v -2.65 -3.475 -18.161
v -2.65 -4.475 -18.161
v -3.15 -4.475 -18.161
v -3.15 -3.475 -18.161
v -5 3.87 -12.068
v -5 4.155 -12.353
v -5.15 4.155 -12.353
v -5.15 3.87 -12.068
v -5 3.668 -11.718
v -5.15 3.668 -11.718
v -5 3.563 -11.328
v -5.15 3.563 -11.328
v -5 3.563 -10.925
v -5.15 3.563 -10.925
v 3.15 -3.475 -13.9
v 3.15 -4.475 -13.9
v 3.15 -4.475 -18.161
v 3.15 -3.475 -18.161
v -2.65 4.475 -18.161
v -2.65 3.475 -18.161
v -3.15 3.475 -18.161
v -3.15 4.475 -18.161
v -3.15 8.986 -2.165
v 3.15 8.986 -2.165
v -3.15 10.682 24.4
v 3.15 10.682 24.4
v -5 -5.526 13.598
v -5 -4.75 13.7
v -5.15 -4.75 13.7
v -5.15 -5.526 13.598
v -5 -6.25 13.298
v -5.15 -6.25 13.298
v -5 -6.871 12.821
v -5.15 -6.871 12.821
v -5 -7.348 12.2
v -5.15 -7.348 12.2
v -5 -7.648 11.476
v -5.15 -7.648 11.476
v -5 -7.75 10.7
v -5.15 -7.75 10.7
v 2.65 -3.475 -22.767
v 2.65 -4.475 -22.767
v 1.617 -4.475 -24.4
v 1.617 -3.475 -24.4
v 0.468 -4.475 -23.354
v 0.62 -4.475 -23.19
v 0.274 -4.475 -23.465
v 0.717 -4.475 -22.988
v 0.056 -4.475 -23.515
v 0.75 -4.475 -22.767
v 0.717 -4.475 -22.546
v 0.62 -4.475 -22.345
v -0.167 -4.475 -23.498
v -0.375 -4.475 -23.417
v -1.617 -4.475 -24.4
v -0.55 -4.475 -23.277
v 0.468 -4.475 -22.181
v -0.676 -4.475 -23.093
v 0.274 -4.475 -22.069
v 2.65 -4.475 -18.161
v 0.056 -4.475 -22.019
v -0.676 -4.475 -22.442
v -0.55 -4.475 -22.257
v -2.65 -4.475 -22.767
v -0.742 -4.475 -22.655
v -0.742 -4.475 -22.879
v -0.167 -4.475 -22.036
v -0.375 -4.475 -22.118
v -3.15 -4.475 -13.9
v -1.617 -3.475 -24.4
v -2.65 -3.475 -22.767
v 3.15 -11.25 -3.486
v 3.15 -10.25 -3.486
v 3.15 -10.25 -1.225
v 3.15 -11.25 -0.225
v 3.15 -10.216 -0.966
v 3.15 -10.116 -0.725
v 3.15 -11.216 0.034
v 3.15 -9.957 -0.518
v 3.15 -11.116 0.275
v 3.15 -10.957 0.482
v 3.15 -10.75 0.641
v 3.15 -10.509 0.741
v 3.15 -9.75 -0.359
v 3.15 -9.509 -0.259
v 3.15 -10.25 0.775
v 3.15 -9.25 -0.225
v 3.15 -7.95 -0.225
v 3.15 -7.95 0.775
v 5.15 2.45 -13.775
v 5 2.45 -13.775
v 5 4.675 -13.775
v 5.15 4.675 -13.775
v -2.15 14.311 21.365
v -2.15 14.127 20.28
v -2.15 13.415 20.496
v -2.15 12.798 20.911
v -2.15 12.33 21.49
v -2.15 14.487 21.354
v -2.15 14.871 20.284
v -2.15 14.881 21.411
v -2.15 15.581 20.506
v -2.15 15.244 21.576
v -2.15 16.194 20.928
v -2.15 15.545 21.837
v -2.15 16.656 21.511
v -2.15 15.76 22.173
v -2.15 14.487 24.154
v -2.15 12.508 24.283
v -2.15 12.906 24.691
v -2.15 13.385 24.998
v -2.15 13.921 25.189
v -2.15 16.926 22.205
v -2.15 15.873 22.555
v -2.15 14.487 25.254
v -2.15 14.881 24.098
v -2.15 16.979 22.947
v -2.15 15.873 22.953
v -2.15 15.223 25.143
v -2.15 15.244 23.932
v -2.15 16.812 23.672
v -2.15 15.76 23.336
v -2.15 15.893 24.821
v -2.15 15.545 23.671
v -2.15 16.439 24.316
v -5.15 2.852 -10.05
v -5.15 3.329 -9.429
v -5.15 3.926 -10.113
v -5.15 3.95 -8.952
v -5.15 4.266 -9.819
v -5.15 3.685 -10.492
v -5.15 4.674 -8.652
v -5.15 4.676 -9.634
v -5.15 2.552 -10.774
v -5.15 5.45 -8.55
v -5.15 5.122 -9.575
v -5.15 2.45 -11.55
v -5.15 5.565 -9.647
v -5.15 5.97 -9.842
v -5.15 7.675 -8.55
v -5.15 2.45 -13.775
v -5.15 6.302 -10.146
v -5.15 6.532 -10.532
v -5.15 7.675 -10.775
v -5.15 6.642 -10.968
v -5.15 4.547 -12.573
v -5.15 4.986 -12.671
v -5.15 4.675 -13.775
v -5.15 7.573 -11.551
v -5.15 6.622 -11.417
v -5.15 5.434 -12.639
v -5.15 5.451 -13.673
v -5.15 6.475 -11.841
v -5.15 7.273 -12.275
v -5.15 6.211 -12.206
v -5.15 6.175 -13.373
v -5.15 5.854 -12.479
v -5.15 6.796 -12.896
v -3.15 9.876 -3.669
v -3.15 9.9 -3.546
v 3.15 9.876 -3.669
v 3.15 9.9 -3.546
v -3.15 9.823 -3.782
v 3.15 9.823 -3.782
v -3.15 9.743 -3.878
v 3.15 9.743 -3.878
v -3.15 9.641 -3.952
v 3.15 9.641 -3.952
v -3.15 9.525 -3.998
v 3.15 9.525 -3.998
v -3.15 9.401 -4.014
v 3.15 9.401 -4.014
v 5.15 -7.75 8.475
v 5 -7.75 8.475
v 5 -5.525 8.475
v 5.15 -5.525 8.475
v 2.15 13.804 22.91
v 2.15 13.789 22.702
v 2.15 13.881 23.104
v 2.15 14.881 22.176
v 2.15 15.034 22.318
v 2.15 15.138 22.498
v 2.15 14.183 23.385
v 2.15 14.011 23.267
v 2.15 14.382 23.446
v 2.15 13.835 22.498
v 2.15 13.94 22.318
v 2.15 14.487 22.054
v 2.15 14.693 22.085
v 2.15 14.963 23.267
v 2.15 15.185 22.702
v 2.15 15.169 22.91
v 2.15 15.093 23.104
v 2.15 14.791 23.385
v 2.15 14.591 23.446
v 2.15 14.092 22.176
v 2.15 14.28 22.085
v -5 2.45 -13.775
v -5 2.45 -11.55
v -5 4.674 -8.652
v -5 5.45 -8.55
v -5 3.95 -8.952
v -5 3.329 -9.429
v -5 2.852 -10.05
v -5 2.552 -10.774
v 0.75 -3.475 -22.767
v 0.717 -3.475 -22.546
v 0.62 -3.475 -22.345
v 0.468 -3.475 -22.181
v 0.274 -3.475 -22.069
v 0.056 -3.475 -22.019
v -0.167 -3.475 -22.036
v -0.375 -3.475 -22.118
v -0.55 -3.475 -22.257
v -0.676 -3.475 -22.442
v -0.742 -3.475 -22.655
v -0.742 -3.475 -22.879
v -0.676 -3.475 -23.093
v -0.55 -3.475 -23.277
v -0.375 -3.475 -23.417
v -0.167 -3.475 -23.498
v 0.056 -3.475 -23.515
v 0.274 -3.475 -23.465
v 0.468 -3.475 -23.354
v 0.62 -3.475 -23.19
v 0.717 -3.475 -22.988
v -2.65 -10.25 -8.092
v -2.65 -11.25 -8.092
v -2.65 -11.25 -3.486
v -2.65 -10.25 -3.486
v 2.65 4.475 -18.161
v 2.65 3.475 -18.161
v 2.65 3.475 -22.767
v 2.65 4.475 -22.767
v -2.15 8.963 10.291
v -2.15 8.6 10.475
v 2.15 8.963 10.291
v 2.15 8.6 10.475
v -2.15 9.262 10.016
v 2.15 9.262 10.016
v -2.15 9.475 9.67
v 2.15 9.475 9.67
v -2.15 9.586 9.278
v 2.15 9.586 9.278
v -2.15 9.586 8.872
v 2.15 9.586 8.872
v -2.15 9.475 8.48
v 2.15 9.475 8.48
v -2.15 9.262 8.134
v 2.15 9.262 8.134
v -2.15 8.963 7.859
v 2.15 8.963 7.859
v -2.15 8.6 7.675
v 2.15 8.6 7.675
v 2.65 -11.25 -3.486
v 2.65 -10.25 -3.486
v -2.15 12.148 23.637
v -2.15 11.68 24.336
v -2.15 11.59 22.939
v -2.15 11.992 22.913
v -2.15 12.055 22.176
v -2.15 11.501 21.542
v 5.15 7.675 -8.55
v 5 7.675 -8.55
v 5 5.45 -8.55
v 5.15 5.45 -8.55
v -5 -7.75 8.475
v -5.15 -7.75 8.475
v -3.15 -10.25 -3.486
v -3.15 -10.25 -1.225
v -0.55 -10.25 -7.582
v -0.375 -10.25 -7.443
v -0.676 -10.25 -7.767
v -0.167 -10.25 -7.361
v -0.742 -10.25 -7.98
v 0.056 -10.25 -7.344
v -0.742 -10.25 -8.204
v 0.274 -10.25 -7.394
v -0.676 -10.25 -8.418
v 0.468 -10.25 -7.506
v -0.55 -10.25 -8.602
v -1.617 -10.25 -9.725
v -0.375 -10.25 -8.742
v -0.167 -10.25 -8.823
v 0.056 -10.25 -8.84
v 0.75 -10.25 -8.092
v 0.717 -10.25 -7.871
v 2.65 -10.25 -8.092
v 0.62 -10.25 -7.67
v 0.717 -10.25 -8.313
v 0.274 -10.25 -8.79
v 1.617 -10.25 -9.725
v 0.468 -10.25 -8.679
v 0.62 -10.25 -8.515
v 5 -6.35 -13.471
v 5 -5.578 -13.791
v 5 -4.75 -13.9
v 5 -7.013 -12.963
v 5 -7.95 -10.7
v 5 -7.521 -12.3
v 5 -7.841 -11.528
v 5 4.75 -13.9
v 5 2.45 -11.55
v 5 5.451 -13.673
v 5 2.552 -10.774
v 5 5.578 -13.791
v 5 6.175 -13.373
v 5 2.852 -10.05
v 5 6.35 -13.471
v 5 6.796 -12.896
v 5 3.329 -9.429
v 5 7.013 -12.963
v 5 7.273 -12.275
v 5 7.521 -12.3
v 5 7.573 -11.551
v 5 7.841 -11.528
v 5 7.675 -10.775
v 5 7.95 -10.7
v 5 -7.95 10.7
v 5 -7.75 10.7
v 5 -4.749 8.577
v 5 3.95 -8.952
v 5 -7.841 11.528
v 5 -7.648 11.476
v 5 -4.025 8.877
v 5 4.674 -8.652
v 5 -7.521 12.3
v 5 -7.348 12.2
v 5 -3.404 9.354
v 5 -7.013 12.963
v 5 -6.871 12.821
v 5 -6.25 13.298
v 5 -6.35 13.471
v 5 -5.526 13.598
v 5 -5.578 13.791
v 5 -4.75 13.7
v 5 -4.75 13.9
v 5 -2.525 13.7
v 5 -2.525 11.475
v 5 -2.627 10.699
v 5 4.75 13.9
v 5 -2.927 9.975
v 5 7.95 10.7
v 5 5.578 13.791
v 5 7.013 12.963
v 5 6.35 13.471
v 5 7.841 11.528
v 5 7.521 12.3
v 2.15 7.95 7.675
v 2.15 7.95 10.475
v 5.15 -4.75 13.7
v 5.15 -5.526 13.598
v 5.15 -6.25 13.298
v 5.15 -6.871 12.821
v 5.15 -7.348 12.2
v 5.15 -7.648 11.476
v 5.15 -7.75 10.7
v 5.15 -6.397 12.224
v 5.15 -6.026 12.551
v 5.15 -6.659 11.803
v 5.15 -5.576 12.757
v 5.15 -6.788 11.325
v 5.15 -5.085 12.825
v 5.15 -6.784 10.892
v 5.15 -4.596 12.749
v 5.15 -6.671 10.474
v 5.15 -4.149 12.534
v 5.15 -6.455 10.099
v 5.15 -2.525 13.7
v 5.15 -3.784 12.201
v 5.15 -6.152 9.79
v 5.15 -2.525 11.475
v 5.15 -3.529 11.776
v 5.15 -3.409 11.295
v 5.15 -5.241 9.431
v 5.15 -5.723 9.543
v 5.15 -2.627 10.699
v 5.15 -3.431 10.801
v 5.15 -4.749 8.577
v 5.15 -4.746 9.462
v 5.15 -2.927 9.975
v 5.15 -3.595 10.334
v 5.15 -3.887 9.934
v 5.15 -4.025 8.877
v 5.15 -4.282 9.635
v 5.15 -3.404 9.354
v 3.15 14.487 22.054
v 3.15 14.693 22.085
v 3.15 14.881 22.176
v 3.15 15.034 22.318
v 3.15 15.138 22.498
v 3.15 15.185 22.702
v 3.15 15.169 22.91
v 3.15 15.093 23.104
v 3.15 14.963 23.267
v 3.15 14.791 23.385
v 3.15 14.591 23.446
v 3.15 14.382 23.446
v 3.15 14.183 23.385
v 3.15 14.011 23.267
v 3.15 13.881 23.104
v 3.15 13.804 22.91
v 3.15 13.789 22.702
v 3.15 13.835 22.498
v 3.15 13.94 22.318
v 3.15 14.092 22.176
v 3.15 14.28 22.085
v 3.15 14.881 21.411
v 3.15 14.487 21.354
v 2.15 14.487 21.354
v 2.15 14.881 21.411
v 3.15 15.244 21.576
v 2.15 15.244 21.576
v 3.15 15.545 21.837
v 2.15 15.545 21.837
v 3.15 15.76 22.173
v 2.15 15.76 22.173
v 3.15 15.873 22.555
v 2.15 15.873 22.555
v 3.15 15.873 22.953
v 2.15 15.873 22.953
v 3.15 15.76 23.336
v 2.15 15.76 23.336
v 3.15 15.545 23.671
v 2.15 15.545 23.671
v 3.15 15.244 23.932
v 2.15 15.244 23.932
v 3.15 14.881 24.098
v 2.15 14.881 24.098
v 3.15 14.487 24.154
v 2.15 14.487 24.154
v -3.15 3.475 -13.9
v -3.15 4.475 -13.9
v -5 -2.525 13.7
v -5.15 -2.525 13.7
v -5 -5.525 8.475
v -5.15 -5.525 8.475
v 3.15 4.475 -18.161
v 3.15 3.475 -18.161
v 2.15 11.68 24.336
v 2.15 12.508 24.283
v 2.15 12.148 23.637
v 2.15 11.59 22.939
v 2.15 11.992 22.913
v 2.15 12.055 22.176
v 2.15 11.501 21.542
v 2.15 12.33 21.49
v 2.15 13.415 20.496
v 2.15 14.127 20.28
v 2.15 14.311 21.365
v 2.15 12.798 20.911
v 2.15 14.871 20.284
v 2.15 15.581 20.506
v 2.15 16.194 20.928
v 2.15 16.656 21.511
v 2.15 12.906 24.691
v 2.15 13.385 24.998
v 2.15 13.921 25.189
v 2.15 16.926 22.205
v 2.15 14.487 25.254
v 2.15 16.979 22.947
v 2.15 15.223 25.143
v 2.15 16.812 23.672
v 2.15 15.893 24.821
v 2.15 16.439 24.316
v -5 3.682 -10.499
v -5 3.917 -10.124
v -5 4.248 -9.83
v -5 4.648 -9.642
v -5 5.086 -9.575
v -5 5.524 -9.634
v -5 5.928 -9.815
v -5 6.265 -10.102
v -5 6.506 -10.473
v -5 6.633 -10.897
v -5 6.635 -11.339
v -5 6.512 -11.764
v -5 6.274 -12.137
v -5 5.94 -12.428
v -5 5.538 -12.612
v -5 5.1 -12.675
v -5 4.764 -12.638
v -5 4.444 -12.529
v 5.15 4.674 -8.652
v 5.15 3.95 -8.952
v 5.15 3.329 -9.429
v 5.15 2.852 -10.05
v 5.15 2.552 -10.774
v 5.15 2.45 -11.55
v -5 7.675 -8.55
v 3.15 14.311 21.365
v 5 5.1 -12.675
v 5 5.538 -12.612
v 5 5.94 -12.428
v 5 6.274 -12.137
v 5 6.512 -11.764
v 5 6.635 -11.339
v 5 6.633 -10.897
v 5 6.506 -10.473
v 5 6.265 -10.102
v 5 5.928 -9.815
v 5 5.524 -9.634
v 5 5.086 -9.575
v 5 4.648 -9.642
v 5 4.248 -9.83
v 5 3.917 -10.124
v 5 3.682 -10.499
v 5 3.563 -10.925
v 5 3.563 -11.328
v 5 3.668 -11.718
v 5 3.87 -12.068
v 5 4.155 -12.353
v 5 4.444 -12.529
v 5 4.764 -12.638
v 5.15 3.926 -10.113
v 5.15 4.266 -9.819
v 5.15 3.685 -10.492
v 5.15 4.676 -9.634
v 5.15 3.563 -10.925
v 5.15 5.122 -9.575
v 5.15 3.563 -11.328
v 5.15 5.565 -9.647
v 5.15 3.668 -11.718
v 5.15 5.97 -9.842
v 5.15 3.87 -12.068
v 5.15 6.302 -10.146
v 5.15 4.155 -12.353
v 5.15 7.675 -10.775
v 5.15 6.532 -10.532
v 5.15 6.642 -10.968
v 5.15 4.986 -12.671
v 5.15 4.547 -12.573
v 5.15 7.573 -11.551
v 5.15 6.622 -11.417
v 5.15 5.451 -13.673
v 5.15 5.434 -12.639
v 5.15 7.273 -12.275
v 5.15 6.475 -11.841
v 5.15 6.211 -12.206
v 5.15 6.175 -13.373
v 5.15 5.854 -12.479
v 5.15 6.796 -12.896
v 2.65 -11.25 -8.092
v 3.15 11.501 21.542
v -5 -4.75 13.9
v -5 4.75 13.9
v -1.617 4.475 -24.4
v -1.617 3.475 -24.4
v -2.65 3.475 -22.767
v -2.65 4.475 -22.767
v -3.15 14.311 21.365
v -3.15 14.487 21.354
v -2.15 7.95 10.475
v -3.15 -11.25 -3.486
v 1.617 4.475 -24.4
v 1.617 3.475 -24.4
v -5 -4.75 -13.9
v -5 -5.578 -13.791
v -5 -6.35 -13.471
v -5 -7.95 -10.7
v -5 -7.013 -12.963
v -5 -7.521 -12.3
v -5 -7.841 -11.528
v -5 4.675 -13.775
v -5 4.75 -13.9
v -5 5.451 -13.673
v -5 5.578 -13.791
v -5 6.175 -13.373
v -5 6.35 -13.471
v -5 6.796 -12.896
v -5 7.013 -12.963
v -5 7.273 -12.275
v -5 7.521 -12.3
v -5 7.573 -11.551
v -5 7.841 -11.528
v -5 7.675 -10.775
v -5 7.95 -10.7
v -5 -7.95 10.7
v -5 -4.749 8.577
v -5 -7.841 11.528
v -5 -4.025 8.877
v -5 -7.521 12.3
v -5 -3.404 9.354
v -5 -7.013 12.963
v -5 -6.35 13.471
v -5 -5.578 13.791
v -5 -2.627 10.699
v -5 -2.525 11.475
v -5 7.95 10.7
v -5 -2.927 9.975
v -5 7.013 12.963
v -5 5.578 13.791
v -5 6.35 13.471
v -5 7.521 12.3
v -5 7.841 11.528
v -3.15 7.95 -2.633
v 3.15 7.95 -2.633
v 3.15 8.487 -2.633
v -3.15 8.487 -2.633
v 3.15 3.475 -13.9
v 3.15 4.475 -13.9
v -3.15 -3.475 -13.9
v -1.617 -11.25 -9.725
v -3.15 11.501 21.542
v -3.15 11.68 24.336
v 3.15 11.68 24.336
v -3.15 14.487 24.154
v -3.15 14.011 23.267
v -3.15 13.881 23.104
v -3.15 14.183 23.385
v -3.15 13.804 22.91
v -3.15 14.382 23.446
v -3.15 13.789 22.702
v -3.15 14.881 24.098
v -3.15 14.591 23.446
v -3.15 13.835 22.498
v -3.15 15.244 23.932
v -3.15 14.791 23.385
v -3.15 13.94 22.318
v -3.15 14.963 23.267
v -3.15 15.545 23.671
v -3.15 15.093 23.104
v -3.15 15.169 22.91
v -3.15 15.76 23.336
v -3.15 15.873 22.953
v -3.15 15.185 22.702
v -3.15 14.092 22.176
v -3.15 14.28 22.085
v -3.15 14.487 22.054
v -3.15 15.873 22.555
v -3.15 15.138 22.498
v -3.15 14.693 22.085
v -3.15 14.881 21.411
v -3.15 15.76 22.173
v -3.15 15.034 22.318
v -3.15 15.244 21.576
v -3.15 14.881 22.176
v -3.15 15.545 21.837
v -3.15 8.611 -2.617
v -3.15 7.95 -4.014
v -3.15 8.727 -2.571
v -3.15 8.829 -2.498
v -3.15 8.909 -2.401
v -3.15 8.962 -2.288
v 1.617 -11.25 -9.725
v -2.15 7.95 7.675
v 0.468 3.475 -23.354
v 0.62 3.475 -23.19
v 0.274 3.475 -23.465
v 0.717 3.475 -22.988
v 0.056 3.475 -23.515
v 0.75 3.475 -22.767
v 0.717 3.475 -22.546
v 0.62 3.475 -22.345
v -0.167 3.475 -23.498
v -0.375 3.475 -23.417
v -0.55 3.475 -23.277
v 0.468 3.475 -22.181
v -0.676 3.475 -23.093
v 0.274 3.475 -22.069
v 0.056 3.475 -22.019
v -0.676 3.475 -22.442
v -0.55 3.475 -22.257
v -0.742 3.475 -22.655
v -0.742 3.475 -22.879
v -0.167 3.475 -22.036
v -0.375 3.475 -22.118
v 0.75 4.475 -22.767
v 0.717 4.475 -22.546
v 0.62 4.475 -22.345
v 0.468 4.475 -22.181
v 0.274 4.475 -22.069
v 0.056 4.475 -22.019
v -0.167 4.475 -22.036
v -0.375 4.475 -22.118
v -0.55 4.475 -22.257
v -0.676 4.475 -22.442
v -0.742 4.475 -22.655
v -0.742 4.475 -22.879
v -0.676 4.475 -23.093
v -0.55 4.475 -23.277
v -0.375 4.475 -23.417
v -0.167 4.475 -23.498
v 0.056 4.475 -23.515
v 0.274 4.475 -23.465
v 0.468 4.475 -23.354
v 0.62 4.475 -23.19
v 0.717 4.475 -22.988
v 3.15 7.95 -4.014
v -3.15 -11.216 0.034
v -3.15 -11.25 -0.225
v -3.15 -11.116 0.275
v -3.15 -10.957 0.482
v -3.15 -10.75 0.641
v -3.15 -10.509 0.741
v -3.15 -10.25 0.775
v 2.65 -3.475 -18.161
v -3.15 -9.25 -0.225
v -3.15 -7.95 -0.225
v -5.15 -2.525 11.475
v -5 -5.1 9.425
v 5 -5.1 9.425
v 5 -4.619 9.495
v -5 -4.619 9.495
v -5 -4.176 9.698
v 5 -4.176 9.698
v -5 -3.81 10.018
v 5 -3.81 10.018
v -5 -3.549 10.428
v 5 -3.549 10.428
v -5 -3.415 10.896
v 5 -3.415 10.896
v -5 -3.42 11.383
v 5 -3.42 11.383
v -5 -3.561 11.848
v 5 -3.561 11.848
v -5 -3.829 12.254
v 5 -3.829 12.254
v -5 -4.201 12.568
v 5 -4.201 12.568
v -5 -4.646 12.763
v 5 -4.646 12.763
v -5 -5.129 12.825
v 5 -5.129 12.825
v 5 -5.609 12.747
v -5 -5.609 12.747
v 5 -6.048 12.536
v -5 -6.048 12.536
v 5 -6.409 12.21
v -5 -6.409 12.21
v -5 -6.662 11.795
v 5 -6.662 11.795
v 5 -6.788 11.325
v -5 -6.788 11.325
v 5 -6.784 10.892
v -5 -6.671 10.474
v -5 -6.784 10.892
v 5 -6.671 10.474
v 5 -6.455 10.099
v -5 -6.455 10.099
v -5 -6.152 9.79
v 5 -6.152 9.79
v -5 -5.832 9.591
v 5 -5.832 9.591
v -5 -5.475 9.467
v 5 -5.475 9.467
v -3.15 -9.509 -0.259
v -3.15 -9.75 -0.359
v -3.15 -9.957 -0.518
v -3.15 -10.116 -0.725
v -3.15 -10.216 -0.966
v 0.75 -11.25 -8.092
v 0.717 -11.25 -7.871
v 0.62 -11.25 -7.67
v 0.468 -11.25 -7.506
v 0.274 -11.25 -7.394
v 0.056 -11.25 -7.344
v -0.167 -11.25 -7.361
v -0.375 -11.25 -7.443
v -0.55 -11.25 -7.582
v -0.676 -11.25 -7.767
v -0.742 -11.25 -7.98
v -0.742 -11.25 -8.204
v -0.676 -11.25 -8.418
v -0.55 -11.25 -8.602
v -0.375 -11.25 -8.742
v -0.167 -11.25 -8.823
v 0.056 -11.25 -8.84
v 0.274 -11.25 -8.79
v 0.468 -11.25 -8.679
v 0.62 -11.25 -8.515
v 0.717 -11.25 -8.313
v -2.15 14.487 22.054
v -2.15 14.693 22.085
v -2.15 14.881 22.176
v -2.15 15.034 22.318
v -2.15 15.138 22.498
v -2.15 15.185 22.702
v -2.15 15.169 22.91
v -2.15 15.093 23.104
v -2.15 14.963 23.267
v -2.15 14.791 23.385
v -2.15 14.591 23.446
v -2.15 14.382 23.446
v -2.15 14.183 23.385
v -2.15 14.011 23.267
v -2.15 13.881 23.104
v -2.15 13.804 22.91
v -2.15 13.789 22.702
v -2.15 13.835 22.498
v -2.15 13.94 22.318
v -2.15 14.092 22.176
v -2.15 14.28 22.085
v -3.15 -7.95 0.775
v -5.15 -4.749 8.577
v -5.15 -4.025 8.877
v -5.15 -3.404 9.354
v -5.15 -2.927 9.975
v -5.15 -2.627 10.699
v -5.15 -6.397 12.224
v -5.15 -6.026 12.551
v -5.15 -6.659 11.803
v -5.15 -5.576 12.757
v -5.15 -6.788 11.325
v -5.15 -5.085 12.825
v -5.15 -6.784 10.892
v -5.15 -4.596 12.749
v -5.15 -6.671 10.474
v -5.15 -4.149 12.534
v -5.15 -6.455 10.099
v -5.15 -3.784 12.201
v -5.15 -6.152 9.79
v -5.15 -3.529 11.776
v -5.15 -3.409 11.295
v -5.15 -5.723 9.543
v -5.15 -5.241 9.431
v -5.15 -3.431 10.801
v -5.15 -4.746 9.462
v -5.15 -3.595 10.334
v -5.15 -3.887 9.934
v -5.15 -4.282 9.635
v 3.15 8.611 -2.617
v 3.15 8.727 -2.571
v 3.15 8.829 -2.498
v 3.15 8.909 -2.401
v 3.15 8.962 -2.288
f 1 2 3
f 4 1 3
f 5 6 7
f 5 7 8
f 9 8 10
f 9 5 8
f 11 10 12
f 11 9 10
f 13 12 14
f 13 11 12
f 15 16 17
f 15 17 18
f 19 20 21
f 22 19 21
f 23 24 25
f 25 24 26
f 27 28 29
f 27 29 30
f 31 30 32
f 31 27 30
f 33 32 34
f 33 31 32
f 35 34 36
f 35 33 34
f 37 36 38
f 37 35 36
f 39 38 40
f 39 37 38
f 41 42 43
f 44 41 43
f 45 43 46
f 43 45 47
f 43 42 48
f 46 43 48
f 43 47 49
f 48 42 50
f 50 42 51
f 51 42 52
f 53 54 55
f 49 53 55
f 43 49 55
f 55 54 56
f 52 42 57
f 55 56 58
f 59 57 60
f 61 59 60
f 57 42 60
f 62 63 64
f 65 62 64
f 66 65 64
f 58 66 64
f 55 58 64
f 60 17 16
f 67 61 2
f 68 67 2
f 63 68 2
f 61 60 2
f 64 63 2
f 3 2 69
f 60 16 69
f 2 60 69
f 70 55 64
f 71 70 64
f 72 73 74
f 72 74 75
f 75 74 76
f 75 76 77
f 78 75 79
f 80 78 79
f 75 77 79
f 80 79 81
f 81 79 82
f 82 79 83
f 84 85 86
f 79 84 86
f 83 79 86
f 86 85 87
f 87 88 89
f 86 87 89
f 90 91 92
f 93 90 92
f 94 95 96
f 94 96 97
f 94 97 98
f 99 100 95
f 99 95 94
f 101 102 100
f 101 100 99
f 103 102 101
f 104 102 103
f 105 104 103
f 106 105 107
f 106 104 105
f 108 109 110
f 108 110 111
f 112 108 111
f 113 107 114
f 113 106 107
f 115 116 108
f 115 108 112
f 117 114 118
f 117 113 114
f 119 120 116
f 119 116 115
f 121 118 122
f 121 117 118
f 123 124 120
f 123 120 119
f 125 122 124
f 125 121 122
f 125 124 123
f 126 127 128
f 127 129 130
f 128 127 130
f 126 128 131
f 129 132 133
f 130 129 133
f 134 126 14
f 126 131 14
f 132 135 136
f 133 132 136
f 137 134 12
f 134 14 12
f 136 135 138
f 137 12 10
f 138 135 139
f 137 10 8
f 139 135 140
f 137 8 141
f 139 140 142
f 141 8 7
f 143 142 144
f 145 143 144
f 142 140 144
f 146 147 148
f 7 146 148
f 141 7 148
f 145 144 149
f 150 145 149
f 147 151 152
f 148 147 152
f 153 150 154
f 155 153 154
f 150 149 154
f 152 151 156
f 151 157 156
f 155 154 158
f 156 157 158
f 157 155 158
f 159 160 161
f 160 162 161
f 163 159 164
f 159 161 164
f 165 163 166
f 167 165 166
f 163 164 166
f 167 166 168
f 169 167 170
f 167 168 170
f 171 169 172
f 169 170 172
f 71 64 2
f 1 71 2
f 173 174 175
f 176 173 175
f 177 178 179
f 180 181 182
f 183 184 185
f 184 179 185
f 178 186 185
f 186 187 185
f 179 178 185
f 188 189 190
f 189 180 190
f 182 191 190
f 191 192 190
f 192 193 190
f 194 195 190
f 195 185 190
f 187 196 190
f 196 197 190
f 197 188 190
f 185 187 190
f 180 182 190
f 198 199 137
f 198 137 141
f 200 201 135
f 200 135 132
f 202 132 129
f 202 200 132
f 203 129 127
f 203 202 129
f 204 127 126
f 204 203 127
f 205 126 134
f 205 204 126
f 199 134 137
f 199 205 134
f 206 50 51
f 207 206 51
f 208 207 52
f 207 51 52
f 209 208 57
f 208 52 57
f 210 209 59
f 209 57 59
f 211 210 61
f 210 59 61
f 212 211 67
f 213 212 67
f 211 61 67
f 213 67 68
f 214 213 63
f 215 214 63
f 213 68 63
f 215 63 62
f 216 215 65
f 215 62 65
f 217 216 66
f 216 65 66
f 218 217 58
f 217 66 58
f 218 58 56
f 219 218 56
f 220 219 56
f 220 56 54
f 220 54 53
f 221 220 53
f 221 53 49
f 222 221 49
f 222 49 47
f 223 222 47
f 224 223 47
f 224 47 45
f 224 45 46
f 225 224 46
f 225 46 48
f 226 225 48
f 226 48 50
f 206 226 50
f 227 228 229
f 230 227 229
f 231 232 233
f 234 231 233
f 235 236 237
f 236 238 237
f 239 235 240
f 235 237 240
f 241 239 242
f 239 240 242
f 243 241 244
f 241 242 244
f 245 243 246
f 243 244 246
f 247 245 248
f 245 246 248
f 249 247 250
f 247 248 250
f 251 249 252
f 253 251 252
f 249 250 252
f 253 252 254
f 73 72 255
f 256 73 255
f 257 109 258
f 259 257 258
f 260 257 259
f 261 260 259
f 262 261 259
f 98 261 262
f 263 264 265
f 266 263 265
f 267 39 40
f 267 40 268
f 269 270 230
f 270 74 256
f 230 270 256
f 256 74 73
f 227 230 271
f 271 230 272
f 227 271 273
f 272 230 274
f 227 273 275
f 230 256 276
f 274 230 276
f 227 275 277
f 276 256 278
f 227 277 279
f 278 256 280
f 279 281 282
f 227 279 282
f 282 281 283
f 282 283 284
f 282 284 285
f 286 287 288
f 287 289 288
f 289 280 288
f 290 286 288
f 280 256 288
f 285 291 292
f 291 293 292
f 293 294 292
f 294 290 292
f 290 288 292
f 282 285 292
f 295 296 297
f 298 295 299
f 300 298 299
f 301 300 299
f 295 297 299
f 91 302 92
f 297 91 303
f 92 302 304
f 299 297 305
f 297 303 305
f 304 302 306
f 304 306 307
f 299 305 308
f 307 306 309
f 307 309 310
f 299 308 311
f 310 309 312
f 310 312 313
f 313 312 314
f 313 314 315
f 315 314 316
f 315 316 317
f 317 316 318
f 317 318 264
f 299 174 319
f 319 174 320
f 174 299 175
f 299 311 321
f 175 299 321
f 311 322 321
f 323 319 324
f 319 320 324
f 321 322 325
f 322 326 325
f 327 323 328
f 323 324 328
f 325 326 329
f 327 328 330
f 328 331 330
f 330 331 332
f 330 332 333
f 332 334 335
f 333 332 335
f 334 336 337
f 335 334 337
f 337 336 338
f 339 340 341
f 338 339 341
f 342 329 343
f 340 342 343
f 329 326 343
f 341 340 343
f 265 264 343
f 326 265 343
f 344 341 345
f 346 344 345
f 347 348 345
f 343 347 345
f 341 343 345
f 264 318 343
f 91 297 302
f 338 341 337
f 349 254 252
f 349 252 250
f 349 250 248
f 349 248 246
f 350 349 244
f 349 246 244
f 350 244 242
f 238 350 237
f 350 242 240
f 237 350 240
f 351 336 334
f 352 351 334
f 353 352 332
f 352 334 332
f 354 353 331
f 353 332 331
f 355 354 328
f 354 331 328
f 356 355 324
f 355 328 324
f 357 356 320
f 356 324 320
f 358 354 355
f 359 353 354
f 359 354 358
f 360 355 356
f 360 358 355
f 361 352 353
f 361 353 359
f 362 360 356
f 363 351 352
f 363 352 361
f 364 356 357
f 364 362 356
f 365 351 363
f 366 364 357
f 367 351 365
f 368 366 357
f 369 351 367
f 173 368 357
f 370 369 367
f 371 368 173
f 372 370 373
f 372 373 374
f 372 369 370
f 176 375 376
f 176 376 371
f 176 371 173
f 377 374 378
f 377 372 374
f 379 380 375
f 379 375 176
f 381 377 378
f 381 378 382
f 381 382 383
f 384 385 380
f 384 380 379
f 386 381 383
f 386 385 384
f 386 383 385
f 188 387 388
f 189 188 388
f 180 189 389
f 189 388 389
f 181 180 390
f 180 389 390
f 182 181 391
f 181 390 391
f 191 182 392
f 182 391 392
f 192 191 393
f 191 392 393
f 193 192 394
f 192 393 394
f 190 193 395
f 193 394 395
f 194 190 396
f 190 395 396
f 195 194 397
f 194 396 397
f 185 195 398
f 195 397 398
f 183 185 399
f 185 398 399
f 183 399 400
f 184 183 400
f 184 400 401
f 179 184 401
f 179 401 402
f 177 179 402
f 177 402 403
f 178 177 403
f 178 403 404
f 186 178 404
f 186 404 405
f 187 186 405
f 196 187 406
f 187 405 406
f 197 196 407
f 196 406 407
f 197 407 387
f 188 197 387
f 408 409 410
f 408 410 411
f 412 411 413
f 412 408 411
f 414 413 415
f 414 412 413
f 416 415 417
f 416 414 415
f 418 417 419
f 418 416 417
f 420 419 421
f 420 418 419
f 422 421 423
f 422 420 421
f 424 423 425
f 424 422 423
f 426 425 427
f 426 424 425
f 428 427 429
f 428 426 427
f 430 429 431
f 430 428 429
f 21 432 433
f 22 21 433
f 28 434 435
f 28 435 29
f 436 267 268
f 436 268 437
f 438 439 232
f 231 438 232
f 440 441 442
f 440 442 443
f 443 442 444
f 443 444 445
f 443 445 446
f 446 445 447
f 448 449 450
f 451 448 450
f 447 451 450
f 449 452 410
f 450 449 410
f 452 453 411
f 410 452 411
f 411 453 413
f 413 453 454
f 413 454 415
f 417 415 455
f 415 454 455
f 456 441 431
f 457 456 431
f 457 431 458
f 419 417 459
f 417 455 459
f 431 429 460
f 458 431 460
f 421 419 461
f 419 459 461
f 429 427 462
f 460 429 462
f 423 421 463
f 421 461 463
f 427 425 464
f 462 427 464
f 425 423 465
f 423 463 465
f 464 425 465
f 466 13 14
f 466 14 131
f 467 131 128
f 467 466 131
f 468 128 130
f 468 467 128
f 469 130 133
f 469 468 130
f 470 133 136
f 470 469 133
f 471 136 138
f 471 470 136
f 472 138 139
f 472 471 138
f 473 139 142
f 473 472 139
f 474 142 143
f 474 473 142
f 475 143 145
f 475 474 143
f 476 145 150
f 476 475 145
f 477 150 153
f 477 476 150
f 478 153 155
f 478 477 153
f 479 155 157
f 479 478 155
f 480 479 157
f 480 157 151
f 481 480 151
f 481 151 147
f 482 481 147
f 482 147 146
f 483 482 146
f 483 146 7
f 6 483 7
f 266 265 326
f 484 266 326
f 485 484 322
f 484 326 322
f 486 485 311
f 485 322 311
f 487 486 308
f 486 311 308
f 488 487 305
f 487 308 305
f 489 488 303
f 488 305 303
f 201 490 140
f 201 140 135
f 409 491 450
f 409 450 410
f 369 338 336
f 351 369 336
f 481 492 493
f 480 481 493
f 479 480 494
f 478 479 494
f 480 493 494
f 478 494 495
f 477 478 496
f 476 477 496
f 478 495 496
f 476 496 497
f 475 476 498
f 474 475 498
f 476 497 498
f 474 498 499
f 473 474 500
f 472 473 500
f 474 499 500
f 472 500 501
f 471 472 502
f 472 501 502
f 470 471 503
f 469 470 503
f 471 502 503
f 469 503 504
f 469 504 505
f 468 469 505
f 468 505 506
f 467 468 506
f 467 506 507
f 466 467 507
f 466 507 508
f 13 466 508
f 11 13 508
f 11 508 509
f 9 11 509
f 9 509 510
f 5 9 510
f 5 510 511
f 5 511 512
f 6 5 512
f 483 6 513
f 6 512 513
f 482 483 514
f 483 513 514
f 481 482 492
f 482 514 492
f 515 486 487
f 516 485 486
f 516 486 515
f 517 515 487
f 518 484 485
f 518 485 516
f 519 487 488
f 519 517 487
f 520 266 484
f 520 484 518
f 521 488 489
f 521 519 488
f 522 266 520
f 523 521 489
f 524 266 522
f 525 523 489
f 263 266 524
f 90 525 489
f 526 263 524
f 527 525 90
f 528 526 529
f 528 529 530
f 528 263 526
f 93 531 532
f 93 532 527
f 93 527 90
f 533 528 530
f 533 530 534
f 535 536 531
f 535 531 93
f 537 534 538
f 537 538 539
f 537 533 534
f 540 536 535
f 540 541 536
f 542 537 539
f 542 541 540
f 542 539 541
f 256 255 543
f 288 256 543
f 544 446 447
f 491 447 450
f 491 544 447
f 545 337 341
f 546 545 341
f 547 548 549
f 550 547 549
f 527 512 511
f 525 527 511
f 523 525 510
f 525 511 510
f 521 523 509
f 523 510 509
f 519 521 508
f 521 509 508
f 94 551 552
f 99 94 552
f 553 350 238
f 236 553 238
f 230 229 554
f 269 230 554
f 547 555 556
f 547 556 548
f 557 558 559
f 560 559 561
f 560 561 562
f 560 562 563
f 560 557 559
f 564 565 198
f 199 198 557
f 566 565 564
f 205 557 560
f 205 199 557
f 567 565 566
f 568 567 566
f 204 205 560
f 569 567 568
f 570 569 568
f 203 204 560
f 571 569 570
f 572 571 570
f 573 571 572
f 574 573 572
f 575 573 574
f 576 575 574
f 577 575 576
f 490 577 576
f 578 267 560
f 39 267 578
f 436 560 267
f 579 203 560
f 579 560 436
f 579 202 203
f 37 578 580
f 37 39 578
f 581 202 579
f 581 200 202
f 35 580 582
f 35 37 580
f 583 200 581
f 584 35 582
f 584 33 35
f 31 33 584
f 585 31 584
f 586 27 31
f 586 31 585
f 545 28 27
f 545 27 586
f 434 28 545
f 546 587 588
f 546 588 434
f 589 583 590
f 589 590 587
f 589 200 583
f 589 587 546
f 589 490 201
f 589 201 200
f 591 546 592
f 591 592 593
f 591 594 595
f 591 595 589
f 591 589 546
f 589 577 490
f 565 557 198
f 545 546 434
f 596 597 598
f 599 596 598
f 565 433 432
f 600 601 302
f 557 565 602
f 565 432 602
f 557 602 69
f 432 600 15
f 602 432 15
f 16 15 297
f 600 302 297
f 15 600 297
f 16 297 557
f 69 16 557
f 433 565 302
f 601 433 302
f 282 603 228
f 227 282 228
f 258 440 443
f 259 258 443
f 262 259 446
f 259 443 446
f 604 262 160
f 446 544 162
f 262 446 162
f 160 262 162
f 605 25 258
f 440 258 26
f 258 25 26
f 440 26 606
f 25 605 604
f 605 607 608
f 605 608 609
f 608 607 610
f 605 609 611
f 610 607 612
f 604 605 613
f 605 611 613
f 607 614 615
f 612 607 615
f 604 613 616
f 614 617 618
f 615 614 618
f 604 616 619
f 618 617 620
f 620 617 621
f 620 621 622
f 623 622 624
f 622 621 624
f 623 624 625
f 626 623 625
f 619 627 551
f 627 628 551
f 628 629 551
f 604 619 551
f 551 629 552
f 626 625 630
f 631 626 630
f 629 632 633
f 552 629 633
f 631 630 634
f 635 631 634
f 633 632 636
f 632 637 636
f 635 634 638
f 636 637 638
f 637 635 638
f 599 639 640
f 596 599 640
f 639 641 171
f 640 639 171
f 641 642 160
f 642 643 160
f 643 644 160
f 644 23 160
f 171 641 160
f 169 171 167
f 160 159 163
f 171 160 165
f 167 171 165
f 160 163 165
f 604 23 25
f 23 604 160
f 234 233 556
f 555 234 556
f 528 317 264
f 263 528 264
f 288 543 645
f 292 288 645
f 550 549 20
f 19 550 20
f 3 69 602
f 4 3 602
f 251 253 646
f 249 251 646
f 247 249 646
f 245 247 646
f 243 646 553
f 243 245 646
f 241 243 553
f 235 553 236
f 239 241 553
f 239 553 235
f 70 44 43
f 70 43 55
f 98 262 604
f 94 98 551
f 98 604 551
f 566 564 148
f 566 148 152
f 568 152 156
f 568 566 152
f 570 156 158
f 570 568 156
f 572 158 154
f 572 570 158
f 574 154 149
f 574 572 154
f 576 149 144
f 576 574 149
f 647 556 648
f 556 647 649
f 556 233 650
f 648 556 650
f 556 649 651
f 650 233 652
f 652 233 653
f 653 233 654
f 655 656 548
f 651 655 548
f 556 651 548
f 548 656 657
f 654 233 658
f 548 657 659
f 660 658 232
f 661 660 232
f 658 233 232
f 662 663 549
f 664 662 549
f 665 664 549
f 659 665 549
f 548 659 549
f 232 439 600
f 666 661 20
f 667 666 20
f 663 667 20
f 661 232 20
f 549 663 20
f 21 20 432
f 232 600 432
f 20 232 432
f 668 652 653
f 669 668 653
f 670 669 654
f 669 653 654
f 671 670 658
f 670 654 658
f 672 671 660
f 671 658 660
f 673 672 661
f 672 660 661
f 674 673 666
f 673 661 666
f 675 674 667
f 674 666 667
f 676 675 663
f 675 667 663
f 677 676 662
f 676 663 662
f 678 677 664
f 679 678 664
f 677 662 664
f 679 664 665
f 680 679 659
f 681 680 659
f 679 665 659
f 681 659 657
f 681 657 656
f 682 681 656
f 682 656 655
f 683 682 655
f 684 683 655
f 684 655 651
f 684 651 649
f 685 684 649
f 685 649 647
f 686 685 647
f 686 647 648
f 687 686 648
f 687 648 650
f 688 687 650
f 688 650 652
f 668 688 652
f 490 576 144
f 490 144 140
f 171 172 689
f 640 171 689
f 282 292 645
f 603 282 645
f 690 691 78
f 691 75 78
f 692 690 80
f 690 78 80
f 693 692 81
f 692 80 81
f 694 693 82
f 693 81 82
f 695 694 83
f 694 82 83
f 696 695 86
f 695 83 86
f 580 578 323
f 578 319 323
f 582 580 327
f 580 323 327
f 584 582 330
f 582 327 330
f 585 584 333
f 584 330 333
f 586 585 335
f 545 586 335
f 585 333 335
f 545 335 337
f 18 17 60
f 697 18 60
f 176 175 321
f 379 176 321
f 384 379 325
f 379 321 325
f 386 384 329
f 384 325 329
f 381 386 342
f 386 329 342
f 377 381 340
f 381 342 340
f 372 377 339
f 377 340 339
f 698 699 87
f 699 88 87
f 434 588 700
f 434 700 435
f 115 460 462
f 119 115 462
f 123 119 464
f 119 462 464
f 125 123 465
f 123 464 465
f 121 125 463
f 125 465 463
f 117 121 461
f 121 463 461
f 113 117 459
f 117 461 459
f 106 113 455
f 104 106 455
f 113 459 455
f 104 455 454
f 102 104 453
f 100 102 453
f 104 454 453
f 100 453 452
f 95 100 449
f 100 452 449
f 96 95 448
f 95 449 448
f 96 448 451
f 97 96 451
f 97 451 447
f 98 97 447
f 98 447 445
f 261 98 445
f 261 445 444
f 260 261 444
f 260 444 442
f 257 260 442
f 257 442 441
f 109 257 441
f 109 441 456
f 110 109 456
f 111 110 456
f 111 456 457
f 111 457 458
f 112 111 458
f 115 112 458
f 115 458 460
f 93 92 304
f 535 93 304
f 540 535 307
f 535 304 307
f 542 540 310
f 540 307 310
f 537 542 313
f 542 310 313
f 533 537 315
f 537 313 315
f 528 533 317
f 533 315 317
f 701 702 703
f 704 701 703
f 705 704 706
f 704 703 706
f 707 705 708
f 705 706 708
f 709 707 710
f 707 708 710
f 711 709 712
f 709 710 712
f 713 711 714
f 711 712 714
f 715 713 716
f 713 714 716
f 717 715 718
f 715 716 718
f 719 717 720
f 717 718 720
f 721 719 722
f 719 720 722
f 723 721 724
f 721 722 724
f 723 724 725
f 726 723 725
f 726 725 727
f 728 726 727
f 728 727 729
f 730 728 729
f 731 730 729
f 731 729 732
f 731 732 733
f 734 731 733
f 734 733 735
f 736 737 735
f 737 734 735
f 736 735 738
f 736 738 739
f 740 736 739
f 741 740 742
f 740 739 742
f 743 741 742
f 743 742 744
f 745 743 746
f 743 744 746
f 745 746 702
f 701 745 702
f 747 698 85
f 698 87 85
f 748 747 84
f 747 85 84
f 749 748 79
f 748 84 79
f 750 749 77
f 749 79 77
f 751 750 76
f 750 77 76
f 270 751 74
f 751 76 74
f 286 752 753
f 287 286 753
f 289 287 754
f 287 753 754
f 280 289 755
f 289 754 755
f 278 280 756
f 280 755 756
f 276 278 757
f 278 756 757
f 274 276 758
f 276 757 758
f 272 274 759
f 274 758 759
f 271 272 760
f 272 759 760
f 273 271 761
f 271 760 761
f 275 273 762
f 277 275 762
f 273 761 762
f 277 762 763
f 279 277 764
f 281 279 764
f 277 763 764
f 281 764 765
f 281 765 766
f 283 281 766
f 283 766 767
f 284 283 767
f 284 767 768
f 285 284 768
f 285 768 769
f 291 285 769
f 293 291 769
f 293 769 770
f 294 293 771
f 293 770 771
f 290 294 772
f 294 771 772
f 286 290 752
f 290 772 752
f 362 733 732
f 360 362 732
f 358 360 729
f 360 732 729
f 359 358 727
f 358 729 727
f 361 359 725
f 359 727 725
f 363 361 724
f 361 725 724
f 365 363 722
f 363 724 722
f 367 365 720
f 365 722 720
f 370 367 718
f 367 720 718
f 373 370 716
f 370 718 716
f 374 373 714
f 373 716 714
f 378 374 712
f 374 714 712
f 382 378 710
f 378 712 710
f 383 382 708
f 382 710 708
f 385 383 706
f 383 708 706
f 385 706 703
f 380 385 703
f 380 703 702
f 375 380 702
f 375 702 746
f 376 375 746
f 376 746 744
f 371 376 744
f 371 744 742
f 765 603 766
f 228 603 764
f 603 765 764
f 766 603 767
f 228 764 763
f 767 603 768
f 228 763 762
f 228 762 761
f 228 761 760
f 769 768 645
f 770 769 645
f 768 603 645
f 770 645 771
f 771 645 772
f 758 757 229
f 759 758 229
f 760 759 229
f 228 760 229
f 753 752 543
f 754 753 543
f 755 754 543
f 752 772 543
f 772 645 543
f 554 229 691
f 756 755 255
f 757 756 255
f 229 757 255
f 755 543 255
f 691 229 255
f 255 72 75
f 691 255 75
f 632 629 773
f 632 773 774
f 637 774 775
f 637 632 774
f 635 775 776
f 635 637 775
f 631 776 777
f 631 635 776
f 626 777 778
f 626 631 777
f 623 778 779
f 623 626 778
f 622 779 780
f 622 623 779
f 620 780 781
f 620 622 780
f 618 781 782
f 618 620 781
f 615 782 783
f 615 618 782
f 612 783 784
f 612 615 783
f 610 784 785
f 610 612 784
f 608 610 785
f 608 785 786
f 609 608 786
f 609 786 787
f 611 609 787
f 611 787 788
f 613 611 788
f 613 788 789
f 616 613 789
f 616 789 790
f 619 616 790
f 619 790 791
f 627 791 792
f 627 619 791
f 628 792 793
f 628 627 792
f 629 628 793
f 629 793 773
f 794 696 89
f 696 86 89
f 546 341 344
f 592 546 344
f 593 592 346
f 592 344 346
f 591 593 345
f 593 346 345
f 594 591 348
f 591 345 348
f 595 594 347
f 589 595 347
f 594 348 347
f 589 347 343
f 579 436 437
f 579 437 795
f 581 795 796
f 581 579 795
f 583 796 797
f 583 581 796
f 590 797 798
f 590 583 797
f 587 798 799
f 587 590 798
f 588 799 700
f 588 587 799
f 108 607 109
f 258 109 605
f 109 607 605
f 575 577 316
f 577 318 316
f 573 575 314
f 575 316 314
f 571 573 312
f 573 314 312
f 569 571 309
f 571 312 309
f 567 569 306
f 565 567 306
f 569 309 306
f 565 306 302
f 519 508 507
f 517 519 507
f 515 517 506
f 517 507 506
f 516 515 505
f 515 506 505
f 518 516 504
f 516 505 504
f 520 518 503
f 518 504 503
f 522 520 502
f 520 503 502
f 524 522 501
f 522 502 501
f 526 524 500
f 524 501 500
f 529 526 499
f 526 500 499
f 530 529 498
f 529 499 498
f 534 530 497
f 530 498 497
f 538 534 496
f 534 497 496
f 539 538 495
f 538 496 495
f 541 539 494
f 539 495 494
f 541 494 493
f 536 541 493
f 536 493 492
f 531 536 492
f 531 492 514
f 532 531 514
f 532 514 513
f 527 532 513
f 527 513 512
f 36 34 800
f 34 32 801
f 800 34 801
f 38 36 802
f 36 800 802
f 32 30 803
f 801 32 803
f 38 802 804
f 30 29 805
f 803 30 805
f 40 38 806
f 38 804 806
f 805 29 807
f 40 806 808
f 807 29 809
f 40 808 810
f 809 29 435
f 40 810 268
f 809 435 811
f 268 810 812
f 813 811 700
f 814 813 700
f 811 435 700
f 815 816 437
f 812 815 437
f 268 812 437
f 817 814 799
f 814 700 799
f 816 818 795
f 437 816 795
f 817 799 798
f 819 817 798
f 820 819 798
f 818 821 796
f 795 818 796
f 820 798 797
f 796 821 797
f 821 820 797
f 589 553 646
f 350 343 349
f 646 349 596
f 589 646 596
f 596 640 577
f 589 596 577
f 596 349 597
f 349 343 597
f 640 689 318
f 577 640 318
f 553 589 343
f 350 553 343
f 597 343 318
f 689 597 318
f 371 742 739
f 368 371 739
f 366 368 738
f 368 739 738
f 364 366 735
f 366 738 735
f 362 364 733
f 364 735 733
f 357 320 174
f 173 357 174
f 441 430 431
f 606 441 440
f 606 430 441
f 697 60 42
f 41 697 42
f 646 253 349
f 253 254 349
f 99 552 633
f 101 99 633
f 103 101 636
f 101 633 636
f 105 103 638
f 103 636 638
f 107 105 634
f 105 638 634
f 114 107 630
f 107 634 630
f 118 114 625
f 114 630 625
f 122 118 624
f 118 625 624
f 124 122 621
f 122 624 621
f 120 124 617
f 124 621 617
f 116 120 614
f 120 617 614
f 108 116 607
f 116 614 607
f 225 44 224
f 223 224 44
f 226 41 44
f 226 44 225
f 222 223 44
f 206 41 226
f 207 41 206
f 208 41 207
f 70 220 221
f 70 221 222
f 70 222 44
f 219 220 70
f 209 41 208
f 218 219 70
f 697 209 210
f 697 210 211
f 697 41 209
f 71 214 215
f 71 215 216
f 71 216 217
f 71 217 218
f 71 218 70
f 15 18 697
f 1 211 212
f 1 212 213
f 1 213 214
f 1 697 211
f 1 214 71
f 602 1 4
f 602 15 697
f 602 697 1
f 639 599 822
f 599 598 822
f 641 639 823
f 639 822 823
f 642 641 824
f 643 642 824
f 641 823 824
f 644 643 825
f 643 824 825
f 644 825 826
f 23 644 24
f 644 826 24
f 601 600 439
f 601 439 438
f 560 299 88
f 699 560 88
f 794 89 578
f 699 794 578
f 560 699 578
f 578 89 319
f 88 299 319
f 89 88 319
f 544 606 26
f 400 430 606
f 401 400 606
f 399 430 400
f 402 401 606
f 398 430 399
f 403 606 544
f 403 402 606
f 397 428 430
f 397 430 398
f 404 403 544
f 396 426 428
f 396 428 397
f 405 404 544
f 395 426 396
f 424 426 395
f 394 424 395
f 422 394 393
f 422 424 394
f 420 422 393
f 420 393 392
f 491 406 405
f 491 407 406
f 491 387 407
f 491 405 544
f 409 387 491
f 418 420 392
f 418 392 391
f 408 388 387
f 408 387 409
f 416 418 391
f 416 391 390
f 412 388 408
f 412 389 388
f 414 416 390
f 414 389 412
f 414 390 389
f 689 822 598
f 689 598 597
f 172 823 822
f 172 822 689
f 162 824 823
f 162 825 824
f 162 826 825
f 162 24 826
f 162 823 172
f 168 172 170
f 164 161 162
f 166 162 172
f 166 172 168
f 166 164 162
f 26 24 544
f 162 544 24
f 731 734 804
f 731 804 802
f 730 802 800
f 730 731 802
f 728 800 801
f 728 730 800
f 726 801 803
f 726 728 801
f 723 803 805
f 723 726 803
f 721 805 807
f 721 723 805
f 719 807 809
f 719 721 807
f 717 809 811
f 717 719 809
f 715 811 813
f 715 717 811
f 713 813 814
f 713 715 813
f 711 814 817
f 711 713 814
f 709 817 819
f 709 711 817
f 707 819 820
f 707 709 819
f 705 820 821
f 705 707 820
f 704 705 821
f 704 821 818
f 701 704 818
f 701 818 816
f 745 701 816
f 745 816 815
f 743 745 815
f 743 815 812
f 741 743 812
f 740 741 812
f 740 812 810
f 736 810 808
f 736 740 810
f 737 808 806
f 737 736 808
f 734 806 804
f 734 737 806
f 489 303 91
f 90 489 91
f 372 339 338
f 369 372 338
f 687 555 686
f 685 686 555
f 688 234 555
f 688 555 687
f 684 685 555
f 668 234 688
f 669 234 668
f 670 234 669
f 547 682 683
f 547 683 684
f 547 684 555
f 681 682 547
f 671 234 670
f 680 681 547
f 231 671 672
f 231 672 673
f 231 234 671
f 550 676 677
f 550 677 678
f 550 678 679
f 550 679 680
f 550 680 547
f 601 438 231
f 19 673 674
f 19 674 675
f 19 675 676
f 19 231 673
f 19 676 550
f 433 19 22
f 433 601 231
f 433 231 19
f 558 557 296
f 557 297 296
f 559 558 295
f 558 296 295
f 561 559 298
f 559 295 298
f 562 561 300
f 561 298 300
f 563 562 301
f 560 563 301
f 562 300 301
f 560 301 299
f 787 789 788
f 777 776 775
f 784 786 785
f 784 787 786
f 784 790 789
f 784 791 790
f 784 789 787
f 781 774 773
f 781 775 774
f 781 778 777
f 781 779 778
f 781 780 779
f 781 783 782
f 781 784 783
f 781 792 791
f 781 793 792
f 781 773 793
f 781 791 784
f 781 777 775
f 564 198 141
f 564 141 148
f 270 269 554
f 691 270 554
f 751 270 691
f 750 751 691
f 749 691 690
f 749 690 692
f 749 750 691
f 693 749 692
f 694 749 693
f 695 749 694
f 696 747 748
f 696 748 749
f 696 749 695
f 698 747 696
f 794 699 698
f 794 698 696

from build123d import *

# Parameters (mm, degrees)
BLOCOBASE_DEPTH           = 5
SKFIXACAO_R               = 1.7
SKFIXACAO_R_2             = 1.55
FIXACAO_DEPTH             = 5.15
RESSALTOFIXACAO_DEPTH     = 0.15
BOTAO_DEPTH               = 2.15
SKETCH5_W                 = 6.3
SKETCH5_H                 = 1
BASECONECTORNONC_DEPTH    = 10.5
SKDESENHOCONECTORNONC_R   = 0.75
DESENHOCONECTORNONC_DEPTH = 20.5
BASECONECTORCOM_DEPTH     = 3.15
SKDESENHOCONECTORCOM_R    = 0.75
DESENHOCONECTORCOM_DEPTH  = 1
BASECONTATO_DEPTH         = 3.15
SKAPOIOROLO_R             = 0.7
APOIOROLO_DEPTH           = 1
SKROLO_R                  = 2.5
ROLO_DEPTH                = 4.3


with BuildPart() as part:
    # skBlocoBase → BlocoBase (new body, symmetric)
    with BuildSketch(Plane(origin=(0, 0, 0), x_dir=(0, 0, -1), z_dir=(1, 0, 0))):
        with BuildLine():
            Line((-10.7, 7.95), (10.7, 7.95))
            ThreePointArc((10.7, 7.95), (12.9627417, 7.0127417), (13.9, 4.75))
            Line((13.9, 4.75), (13.9, -4.75))
            ThreePointArc((13.9, -4.75), (12.9627417, -7.0127417), (10.7, -7.95))
            Line((10.7, -7.95), (-10.7, -7.95))
            ThreePointArc((-10.7, -7.95), (-12.9627417, -7.0127417), (-13.9, -4.75))
            Line((-13.9, -4.75), (-13.9, 4.75))
            ThreePointArc((-13.9, 4.75), (-12.9627417, 7.0127417), (-10.7, 7.95))
        make_face()
    extrude(amount=BLOCOBASE_DEPTH, both=True)

    # skFixacao → Fixacao (cut, symmetric)
    with BuildSketch(Plane(origin=(0, 0, 0), x_dir=(0, 0, -1), z_dir=(1, 0, 0))):
        with Locations((-11.125, -5.1)):
            Circle(SKFIXACAO_R)
        with Locations((11.125, 5.1)):
            Circle(SKFIXACAO_R_2)
    extrude(amount=FIXACAO_DEPTH, both=True, mode=Mode.SUBTRACT)

    # skRessaltoFixacao → RessaltoFixacao (add)
    with BuildSketch(Plane(origin=(5, 0, 0), x_dir=(0, 0, -1), z_dir=(1, 0, 0))):
        with BuildLine():
            ThreePointArc((-8.475, -5.525), (-9.353679656, -3.403679656), (-11.475, -2.525))
            Line((-11.475, -2.525), (-13.7, -2.525))
            Line((-13.7, -2.525), (-13.7, -4.75))
            ThreePointArc((-13.7, -4.75), (-12.821320344, -6.871320344), (-10.7, -7.75))
            Line((-10.7, -7.75), (-8.475, -7.75))
            Line((-8.475, -7.75), (-8.475, -5.525))
        make_face()
        with BuildLine():
            ThreePointArc((-9.789845005, -6.152312282), (-10.474438165, -6.670595205), (-11.325, -6.788194302))
            ThreePointArc((-11.325, -6.788194302), (-11.775561835, -3.529404795), (-9.789845005, -6.152312282))
        make_face(mode=Mode.SUBTRACT)
        with BuildLine():
            ThreePointArc((13.775, 4.675), (12.896320344, 6.796320344), (10.775, 7.675))
            Line((10.775, 7.675), (8.55, 7.675))
            Line((8.55, 7.675), (8.55, 5.45))
            ThreePointArc((8.55, 5.45), (9.428679656, 3.328679656), (11.55, 2.45))
            Line((11.55, 2.45), (13.775, 2.45))
            Line((13.775, 2.45), (13.775, 4.675))
        make_face()
        with BuildLine():
            ThreePointArc((12.353274612, 4.1545681), (11.71815932, 3.667986725), (10.925, 3.562957385))
            ThreePointArc((10.925, 3.562957385), (10.53184068, 6.532013275), (12.353274612, 4.1545681))
        make_face(mode=Mode.SUBTRACT)
    ressaltofixacao = extrude(amount=RESSALTOFIXACAO_DEPTH)

    # MirrorRessaltoFixacao: RessaltoFixacao across plane
    add(ressaltofixacao.mirror(Plane(origin=(0, 0, 0), x_dir=(0, 0, 1), z_dir=(1, 0, 0))))

    # skBotao → Botao (add, symmetric)
    with BuildSketch(Plane(origin=(0, 0, 0), x_dir=(0, 0, -1), z_dir=(1, 0, 0))):
        with BuildLine():
            Line((-10.475, 7.95), (-10.475, 8.6))
            ThreePointArc((-10.475, 8.6), (-9.075, 9.6), (-7.675, 8.6))
            Line((-7.675, 8.6), (-7.675, 7.95))
            Line((-7.675, 7.95), (-10.475, 7.95))
        make_face()
    extrude(amount=BOTAO_DEPTH, both=True)

    # Sketch5 → BaseConectorNONC (add)
    with BuildSketch(Plane(origin=(0, 0, -13.9), x_dir=(-1, 0, 0), z_dir=(0, 0, -1))):
        with Locations((0, -3.975)):
            Rectangle(SKETCH5_W, SKETCH5_H)
        with Locations((0, 3.975)):
            Rectangle(SKETCH5_W, SKETCH5_H)
    extrude(amount=BASECONECTORNONC_DEPTH)

    # skDesenhoConectorNONC → DesenhoConectorNONC (cut)
    with BuildSketch(Plane.XZ.offset(4.475)):
        Polygon((2.65, -22.767142952), (1.616967042, -24.4), (3.15, -24.4), (3.15, -18.161236833), (2.65, -18.161236833), align=None)
        Polygon((-3.15, -24.4), (-1.616967042, -24.4), (-2.65, -22.767142952), (-2.65, -18.161236833), (-3.15, -18.161236833), align=None)
        with Locations((0, -22.767142952)):
            Circle(SKDESENHOCONECTORNONC_R)
    extrude(amount=-DESENHOCONECTORNONC_DEPTH, mode=Mode.SUBTRACT)

    # skBaseConectorCOM → BaseConectorCOM (add, symmetric)
    with BuildSketch(Plane(origin=(0, 0, 0), x_dir=(0, 0, -1), z_dir=(1, 0, 0))):
        with BuildLine():
            Line((9.725, -11.25), (0.225, -11.25))
            ThreePointArc((0.225, -11.25), (-0.482106781, -10.957106781), (-0.775, -10.25))
            Line((-0.775, -10.25), (-0.775, -7.95))
            Line((-0.775, -7.95), (0.225, -7.95))
            Line((0.225, -7.95), (0.225, -9.25))
            ThreePointArc((0.225, -9.25), (0.517893219, -9.957106781), (1.225, -10.25))
            Line((1.225, -10.25), (9.725, -10.25))
            Line((9.725, -10.25), (9.725, -11.25))
        make_face()
    extrude(amount=BASECONECTORCOM_DEPTH, both=True)

    # skDesenhoConectorCOM → DesenhoConectorCOM (cut)
    with BuildSketch(Plane.XZ.offset(11.25)):
        Polygon((2.65, -8.092142952), (1.616967042, -9.725), (3.15, -9.725), (3.15, -3.486236833), (2.65, -3.486236833), align=None)
        Polygon((-3.15, -9.725), (-1.616967042, -9.725), (-2.65, -8.092142952), (-2.65, -3.486236833), (-3.15, -3.486236833), align=None)
        with Locations((0, -8.092142952)):
            Circle(SKDESENHOCONECTORCOM_R)
    extrude(amount=-DESENHOCONECTORCOM_DEPTH, mode=Mode.SUBTRACT)

    # skBaseContato → BaseContato (add, symmetric)
    with BuildSketch(Plane(origin=(0, 0, 0), x_dir=(0, 0, -1), z_dir=(1, 0, 0))):
        with BuildLine():
            Line((2.63302332, 7.95), (2.63302332, 8.486635004))
            ThreePointArc((2.63302332, 8.486635004), (2.497665983, 8.828739854), (2.164880406, 8.985619098))
            Line((2.164880406, 8.985619098), (-24.4, 10.681624431))
            Line((-24.4, 10.681624431), (-24.336285828, 11.679592619))
            Line((-24.336285828, 11.679592619), (3.545575005, 9.899506131))
            ThreePointArc((3.545575005, 9.899506131), (3.878360582, 9.742626887), (4.013717919, 9.400522037))
            Line((4.013717919, 9.400522037), (4.013717919, 7.95))
            Line((4.013717919, 7.95), (2.63302332, 7.95))
        make_face()
    extrude(amount=BASECONTATO_DEPTH, both=True)

    # skApoioRolo → ApoioRolo (add)
    with BuildSketch(Plane(origin=(3.15, 0, 0), x_dir=(0, 0, -1), z_dir=(1, 0, 0))):
        with BuildLine():
            ThreePointArc((-21.354211514, 14.486814776), (-22.754211514, 15.886814776), (-24.154211514, 14.486814776))
            Line((-24.154211514, 14.486814776), (-24.336285828, 11.679592619))
            Line((-24.336285828, 11.679592619), (-22.939130364, 11.590392778))
            Line((-22.939130364, 11.590392778), (-21.541974901, 11.501192936))
            Line((-21.541974901, 11.501192936), (-21.365242034, 14.3114187))
            Line((-21.365242034, 14.3114187), (-21.354211514, 14.486814776))
        make_face()
        with Locations((-22.754211514, 14.486814776)):
            Circle(SKAPOIOROLO_R, mode=Mode.SUBTRACT)
    apoiorolo = extrude(amount=-APOIOROLO_DEPTH)

    # MirrorApoioRolo: ApoioRolo across plane
    add(apoiorolo.mirror(Plane(origin=(0, 0, 0), x_dir=(0, 0, 1), z_dir=(1, 0, 0))))

    # skRolo → Rolo (add)
    with BuildSketch(Plane.ZY.offset(-2.15)):
        with Locations((22.754211514, 14.486814776)):
            Circle(SKROLO_R)
    extrude(amount=ROLO_DEPTH)


solid = part.part
